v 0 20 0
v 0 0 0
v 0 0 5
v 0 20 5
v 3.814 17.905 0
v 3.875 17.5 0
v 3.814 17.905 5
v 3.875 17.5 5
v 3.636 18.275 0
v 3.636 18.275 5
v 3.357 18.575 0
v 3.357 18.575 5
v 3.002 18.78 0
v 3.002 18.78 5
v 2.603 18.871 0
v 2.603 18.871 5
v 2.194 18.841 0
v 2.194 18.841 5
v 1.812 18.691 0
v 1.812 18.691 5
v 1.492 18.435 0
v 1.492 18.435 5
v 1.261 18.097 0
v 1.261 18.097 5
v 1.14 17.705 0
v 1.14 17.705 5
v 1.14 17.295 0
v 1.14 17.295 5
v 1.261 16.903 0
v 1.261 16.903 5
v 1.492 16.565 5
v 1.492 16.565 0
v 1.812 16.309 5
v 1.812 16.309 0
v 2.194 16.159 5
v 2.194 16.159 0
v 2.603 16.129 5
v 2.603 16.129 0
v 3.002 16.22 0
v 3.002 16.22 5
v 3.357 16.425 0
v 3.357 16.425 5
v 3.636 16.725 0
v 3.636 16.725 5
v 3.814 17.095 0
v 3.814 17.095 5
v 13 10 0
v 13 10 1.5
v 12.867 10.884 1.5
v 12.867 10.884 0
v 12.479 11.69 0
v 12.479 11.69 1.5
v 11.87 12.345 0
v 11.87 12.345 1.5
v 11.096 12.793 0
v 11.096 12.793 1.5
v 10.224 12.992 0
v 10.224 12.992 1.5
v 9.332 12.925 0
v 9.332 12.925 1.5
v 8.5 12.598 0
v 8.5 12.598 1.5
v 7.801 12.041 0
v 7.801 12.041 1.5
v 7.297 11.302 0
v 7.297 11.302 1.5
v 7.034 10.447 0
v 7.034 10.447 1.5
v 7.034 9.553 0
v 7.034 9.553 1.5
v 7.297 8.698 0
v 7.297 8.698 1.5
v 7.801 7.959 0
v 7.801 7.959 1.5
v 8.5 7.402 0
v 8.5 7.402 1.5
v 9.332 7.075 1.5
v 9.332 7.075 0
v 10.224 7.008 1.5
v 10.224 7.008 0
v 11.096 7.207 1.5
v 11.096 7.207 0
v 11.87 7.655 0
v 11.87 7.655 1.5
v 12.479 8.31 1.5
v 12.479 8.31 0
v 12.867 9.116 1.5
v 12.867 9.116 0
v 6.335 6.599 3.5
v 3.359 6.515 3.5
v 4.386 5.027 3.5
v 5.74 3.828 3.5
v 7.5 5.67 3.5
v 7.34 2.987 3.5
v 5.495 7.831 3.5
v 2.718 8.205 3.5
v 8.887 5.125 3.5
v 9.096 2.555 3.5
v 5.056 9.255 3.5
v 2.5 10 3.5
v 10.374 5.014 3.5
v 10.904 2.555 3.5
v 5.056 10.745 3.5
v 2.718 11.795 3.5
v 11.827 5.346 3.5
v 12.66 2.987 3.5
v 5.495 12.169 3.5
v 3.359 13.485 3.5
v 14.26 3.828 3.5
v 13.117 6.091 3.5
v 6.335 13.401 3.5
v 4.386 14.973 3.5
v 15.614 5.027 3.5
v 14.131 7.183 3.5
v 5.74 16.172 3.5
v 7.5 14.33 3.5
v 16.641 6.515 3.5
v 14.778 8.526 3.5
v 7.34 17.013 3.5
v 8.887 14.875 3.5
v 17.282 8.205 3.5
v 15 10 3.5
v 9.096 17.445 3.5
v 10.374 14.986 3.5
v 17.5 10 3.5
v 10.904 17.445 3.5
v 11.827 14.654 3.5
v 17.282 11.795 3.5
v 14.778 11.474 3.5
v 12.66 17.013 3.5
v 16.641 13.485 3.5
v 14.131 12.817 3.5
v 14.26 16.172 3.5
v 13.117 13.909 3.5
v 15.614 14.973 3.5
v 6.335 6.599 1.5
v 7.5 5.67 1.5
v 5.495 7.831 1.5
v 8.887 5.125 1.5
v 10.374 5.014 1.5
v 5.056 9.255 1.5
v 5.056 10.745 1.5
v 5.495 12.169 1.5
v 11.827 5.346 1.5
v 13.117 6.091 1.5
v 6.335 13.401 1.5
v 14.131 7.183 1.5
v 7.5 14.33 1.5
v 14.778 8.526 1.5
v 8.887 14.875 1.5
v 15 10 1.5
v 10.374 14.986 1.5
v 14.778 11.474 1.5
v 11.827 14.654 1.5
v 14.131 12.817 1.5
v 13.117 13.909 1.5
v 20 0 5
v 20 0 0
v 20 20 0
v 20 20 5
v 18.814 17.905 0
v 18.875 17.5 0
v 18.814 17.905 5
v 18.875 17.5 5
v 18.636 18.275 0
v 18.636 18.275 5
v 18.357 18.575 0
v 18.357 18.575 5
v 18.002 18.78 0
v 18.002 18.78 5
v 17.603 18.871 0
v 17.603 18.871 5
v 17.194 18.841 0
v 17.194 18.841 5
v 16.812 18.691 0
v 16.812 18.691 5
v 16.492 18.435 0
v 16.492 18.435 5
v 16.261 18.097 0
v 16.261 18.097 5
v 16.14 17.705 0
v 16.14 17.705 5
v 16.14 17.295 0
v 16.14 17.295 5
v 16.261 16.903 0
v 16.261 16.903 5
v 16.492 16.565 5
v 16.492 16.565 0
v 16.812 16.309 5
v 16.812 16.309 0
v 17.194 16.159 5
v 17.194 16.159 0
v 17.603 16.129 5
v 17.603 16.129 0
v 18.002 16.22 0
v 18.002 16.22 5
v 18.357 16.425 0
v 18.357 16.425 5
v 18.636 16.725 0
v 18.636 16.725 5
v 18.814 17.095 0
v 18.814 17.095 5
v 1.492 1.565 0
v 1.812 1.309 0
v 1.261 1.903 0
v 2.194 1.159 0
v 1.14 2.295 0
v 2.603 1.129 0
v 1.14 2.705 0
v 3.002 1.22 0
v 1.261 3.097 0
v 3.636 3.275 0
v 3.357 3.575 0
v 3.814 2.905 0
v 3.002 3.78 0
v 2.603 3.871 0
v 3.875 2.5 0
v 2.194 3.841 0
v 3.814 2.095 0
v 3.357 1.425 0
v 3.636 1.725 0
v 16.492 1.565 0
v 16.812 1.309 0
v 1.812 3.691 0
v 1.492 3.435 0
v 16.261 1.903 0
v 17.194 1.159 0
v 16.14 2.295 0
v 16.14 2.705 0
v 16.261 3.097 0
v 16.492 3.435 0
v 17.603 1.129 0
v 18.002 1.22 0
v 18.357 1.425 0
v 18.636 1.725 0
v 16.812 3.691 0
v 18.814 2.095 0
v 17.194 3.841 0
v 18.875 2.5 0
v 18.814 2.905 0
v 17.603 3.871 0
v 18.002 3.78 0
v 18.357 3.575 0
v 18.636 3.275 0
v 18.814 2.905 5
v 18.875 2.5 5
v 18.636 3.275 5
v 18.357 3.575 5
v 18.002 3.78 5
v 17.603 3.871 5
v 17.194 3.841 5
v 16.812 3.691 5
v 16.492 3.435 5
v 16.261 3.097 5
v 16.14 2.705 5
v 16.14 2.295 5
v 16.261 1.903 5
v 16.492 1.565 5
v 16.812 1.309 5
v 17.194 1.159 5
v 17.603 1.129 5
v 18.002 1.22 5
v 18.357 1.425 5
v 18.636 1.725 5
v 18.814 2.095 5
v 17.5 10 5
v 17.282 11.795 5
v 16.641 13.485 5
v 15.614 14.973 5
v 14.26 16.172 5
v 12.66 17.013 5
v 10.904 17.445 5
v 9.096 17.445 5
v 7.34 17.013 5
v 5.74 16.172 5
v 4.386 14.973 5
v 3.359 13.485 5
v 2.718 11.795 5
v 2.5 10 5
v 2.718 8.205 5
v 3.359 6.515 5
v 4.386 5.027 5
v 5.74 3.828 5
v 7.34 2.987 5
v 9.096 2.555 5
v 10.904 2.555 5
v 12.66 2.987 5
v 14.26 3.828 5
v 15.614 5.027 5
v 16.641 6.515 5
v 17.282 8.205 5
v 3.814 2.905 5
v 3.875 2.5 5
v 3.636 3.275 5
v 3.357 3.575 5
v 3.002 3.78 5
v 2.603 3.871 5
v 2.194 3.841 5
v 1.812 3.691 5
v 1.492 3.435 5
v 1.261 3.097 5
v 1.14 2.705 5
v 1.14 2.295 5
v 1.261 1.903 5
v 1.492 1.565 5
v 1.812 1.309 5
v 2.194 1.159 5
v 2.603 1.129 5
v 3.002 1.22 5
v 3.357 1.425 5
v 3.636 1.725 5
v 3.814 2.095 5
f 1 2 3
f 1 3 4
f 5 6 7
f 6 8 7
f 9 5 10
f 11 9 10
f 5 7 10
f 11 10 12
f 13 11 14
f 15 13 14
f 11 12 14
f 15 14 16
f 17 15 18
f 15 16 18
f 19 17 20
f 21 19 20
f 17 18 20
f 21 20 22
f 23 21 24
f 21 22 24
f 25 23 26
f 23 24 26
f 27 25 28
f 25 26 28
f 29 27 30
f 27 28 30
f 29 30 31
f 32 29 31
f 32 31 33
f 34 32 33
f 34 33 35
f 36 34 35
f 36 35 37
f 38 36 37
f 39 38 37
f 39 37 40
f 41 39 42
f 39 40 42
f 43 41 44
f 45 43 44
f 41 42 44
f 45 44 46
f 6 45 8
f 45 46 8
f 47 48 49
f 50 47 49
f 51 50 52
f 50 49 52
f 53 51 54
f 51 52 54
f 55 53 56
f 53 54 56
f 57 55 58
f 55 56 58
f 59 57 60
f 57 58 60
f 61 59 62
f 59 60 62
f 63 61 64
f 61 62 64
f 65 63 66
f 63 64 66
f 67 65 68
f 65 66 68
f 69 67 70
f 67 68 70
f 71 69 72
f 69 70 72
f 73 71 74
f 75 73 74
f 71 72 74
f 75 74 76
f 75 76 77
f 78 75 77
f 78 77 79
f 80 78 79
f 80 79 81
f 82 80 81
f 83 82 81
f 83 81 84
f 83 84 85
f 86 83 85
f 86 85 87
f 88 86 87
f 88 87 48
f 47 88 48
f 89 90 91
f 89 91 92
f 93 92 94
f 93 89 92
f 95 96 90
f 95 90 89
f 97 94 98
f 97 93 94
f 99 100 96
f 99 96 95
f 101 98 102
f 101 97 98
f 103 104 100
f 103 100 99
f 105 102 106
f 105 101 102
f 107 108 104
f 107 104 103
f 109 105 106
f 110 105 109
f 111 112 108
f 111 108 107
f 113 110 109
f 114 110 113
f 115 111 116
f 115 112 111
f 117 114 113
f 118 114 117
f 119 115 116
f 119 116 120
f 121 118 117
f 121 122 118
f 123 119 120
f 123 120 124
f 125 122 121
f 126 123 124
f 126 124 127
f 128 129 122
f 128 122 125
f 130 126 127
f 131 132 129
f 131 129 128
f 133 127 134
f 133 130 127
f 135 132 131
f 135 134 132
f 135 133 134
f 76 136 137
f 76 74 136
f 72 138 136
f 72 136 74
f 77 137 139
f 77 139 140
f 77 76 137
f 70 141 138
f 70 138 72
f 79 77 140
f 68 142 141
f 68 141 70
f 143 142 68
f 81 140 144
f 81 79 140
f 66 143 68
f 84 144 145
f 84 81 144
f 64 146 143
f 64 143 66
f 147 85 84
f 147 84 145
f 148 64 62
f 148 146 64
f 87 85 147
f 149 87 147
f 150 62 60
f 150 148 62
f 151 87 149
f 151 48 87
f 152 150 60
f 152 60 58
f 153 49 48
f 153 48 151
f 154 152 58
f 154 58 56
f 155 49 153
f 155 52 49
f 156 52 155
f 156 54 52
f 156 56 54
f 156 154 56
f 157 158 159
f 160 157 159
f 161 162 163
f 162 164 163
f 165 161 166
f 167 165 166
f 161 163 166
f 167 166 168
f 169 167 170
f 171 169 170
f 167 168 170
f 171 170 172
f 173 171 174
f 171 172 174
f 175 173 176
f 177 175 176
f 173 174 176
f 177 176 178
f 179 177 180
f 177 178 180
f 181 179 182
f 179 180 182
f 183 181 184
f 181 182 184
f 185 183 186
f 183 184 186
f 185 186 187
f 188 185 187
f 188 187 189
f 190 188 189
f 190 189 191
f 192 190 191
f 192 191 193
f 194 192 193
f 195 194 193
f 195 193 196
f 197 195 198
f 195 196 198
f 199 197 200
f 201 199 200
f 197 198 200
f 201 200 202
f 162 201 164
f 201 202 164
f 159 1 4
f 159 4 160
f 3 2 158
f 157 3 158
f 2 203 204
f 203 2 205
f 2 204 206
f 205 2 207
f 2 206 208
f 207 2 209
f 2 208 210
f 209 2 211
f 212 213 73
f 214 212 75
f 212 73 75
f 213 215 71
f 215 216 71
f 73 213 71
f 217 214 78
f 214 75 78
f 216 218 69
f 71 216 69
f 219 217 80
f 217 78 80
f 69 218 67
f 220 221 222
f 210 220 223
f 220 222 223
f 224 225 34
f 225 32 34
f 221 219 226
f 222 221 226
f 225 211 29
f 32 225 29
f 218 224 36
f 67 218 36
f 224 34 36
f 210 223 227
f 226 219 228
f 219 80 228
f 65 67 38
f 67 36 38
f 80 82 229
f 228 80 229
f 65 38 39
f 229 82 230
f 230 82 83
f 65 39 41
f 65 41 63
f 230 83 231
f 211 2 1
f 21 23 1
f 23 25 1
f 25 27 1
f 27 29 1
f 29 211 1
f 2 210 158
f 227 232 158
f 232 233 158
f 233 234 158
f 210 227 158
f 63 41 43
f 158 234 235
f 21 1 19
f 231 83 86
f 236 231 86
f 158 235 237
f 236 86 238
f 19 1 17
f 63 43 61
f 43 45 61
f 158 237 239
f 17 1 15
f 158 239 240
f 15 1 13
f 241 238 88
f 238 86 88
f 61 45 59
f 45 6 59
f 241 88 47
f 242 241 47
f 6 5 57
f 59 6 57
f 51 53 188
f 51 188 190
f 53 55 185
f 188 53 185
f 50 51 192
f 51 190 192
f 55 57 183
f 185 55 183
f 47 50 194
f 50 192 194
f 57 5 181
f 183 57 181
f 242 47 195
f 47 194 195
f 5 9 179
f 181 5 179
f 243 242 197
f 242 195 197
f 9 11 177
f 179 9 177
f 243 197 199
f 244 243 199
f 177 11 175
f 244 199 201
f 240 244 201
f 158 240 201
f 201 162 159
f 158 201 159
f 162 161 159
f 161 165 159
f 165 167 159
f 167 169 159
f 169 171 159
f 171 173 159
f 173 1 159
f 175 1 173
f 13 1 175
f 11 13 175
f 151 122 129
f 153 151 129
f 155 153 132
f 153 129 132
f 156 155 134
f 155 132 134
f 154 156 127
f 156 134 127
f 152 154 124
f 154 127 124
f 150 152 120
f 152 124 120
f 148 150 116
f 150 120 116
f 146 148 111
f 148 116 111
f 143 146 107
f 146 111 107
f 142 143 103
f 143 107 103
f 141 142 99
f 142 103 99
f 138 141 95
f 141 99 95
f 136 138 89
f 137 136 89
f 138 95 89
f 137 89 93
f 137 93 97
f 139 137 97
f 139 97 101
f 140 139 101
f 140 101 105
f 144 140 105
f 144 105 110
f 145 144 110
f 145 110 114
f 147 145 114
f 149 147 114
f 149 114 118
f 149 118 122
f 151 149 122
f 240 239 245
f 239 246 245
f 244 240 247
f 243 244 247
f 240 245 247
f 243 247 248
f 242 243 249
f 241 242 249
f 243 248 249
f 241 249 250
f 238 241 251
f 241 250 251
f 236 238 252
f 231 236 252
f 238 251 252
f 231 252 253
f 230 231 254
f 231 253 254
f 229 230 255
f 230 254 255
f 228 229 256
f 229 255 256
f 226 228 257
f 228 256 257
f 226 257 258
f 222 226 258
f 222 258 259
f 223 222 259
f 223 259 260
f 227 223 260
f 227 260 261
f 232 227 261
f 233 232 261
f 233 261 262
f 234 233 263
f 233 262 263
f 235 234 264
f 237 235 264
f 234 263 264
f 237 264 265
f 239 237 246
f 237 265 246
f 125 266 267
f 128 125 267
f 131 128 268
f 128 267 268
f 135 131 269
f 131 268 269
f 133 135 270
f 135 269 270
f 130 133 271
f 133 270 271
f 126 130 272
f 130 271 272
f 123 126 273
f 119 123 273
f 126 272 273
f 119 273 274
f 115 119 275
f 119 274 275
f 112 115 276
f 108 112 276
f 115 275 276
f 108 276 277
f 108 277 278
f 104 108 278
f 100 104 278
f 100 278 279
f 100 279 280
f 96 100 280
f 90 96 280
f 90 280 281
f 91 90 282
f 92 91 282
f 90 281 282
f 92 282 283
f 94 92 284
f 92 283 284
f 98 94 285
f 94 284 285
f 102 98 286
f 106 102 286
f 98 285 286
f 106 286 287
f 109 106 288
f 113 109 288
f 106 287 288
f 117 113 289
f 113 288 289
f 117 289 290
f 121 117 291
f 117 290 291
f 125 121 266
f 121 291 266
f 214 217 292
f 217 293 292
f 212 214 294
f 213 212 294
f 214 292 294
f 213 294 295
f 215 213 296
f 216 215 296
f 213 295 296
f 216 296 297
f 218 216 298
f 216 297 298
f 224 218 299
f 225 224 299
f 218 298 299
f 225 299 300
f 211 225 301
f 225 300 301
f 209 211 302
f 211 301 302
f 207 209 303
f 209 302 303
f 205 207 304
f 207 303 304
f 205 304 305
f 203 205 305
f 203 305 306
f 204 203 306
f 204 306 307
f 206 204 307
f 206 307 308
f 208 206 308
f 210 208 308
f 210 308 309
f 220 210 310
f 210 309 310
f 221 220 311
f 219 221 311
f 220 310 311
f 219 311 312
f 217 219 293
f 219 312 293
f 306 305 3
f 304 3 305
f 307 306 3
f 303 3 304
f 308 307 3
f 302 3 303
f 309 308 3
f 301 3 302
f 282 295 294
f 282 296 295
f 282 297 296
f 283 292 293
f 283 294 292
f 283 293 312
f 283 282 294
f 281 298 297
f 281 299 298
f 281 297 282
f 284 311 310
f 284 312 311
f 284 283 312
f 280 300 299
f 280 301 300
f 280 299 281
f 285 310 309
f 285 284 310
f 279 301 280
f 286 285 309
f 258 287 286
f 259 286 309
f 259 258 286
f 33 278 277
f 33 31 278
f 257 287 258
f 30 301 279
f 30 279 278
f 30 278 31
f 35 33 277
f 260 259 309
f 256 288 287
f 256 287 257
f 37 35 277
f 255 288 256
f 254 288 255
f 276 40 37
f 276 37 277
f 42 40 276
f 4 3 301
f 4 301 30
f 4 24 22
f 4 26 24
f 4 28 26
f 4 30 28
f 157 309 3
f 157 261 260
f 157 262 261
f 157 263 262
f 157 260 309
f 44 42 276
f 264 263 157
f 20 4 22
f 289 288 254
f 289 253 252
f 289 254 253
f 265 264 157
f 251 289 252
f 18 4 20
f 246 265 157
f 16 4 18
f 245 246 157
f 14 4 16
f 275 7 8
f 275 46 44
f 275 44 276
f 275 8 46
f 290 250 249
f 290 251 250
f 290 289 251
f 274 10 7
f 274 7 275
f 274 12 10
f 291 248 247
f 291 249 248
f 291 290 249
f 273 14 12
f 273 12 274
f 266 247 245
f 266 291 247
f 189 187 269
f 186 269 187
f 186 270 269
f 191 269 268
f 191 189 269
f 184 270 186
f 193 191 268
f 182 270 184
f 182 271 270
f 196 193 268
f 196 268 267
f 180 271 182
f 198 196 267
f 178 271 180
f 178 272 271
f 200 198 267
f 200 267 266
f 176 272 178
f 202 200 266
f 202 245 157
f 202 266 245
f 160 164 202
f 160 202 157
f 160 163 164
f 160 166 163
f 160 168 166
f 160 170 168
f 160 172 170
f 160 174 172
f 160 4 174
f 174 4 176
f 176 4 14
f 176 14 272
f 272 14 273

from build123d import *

# Parameters (mm, degrees)
F0_W     = 20
F0_H     = 20
F1_DEPTH = 5
F2_R     = 3
F2_R_2   = 1.375
F3_DEPTH = 25
F4_R     = 5
F5_DEPTH = 3.5
F6_R     = 7.5
F7_DEPTH = 1.5


with BuildPart() as f1:
    # F0 (on Top) → F1 (new body)
    with BuildSketch(Plane.XY):
        with Locations((10, 10)):
            Rectangle(F0_W, F0_H)
    extrude(amount=F1_DEPTH)

    # F2 (on face) → F3 (cut)
    with BuildSketch(Plane.XY.offset(5)):
        with Locations((10, 10)):
            Circle(F2_R)
        with Locations((2.5, 17.5)):
            Circle(F2_R_2)
        with Locations((17.5, 17.5)):
            Circle(F2_R_2)
        with Locations((17.5, 2.5)):
            Circle(F2_R_2)
        with Locations((2.5, 2.5)):
            Circle(F2_R_2)
    extrude(amount=-F3_DEPTH, mode=Mode.SUBTRACT)

    # F4 (on face) → F5 (cut)
    with BuildSketch(Plane.XY.offset(5)):
        with Locations((10, 10)):
            Circle(F4_R)
    extrude(amount=-F5_DEPTH, mode=Mode.SUBTRACT)

    # F6 (on face) + F2 (on face) → F7 (cut)
    with BuildSketch(Plane.XY.offset(5)):
        with Locations((10, 10)):
            Circle(F6_R)
    with BuildSketch(Plane.XY.offset(5)):
        with Locations((10, 10)):
            Circle(F2_R)
        with Locations((2.5, 2.5)):
            Circle(F2_R_2)
        with Locations((2.5, 17.5)):
            Circle(F2_R_2)
        with Locations((17.5, 17.5)):
            Circle(F2_R_2)
        with Locations((17.5, 2.5)):
            Circle(F2_R_2)
    extrude(amount=-F7_DEPTH, mode=Mode.SUBTRACT)


solid = f1.part
